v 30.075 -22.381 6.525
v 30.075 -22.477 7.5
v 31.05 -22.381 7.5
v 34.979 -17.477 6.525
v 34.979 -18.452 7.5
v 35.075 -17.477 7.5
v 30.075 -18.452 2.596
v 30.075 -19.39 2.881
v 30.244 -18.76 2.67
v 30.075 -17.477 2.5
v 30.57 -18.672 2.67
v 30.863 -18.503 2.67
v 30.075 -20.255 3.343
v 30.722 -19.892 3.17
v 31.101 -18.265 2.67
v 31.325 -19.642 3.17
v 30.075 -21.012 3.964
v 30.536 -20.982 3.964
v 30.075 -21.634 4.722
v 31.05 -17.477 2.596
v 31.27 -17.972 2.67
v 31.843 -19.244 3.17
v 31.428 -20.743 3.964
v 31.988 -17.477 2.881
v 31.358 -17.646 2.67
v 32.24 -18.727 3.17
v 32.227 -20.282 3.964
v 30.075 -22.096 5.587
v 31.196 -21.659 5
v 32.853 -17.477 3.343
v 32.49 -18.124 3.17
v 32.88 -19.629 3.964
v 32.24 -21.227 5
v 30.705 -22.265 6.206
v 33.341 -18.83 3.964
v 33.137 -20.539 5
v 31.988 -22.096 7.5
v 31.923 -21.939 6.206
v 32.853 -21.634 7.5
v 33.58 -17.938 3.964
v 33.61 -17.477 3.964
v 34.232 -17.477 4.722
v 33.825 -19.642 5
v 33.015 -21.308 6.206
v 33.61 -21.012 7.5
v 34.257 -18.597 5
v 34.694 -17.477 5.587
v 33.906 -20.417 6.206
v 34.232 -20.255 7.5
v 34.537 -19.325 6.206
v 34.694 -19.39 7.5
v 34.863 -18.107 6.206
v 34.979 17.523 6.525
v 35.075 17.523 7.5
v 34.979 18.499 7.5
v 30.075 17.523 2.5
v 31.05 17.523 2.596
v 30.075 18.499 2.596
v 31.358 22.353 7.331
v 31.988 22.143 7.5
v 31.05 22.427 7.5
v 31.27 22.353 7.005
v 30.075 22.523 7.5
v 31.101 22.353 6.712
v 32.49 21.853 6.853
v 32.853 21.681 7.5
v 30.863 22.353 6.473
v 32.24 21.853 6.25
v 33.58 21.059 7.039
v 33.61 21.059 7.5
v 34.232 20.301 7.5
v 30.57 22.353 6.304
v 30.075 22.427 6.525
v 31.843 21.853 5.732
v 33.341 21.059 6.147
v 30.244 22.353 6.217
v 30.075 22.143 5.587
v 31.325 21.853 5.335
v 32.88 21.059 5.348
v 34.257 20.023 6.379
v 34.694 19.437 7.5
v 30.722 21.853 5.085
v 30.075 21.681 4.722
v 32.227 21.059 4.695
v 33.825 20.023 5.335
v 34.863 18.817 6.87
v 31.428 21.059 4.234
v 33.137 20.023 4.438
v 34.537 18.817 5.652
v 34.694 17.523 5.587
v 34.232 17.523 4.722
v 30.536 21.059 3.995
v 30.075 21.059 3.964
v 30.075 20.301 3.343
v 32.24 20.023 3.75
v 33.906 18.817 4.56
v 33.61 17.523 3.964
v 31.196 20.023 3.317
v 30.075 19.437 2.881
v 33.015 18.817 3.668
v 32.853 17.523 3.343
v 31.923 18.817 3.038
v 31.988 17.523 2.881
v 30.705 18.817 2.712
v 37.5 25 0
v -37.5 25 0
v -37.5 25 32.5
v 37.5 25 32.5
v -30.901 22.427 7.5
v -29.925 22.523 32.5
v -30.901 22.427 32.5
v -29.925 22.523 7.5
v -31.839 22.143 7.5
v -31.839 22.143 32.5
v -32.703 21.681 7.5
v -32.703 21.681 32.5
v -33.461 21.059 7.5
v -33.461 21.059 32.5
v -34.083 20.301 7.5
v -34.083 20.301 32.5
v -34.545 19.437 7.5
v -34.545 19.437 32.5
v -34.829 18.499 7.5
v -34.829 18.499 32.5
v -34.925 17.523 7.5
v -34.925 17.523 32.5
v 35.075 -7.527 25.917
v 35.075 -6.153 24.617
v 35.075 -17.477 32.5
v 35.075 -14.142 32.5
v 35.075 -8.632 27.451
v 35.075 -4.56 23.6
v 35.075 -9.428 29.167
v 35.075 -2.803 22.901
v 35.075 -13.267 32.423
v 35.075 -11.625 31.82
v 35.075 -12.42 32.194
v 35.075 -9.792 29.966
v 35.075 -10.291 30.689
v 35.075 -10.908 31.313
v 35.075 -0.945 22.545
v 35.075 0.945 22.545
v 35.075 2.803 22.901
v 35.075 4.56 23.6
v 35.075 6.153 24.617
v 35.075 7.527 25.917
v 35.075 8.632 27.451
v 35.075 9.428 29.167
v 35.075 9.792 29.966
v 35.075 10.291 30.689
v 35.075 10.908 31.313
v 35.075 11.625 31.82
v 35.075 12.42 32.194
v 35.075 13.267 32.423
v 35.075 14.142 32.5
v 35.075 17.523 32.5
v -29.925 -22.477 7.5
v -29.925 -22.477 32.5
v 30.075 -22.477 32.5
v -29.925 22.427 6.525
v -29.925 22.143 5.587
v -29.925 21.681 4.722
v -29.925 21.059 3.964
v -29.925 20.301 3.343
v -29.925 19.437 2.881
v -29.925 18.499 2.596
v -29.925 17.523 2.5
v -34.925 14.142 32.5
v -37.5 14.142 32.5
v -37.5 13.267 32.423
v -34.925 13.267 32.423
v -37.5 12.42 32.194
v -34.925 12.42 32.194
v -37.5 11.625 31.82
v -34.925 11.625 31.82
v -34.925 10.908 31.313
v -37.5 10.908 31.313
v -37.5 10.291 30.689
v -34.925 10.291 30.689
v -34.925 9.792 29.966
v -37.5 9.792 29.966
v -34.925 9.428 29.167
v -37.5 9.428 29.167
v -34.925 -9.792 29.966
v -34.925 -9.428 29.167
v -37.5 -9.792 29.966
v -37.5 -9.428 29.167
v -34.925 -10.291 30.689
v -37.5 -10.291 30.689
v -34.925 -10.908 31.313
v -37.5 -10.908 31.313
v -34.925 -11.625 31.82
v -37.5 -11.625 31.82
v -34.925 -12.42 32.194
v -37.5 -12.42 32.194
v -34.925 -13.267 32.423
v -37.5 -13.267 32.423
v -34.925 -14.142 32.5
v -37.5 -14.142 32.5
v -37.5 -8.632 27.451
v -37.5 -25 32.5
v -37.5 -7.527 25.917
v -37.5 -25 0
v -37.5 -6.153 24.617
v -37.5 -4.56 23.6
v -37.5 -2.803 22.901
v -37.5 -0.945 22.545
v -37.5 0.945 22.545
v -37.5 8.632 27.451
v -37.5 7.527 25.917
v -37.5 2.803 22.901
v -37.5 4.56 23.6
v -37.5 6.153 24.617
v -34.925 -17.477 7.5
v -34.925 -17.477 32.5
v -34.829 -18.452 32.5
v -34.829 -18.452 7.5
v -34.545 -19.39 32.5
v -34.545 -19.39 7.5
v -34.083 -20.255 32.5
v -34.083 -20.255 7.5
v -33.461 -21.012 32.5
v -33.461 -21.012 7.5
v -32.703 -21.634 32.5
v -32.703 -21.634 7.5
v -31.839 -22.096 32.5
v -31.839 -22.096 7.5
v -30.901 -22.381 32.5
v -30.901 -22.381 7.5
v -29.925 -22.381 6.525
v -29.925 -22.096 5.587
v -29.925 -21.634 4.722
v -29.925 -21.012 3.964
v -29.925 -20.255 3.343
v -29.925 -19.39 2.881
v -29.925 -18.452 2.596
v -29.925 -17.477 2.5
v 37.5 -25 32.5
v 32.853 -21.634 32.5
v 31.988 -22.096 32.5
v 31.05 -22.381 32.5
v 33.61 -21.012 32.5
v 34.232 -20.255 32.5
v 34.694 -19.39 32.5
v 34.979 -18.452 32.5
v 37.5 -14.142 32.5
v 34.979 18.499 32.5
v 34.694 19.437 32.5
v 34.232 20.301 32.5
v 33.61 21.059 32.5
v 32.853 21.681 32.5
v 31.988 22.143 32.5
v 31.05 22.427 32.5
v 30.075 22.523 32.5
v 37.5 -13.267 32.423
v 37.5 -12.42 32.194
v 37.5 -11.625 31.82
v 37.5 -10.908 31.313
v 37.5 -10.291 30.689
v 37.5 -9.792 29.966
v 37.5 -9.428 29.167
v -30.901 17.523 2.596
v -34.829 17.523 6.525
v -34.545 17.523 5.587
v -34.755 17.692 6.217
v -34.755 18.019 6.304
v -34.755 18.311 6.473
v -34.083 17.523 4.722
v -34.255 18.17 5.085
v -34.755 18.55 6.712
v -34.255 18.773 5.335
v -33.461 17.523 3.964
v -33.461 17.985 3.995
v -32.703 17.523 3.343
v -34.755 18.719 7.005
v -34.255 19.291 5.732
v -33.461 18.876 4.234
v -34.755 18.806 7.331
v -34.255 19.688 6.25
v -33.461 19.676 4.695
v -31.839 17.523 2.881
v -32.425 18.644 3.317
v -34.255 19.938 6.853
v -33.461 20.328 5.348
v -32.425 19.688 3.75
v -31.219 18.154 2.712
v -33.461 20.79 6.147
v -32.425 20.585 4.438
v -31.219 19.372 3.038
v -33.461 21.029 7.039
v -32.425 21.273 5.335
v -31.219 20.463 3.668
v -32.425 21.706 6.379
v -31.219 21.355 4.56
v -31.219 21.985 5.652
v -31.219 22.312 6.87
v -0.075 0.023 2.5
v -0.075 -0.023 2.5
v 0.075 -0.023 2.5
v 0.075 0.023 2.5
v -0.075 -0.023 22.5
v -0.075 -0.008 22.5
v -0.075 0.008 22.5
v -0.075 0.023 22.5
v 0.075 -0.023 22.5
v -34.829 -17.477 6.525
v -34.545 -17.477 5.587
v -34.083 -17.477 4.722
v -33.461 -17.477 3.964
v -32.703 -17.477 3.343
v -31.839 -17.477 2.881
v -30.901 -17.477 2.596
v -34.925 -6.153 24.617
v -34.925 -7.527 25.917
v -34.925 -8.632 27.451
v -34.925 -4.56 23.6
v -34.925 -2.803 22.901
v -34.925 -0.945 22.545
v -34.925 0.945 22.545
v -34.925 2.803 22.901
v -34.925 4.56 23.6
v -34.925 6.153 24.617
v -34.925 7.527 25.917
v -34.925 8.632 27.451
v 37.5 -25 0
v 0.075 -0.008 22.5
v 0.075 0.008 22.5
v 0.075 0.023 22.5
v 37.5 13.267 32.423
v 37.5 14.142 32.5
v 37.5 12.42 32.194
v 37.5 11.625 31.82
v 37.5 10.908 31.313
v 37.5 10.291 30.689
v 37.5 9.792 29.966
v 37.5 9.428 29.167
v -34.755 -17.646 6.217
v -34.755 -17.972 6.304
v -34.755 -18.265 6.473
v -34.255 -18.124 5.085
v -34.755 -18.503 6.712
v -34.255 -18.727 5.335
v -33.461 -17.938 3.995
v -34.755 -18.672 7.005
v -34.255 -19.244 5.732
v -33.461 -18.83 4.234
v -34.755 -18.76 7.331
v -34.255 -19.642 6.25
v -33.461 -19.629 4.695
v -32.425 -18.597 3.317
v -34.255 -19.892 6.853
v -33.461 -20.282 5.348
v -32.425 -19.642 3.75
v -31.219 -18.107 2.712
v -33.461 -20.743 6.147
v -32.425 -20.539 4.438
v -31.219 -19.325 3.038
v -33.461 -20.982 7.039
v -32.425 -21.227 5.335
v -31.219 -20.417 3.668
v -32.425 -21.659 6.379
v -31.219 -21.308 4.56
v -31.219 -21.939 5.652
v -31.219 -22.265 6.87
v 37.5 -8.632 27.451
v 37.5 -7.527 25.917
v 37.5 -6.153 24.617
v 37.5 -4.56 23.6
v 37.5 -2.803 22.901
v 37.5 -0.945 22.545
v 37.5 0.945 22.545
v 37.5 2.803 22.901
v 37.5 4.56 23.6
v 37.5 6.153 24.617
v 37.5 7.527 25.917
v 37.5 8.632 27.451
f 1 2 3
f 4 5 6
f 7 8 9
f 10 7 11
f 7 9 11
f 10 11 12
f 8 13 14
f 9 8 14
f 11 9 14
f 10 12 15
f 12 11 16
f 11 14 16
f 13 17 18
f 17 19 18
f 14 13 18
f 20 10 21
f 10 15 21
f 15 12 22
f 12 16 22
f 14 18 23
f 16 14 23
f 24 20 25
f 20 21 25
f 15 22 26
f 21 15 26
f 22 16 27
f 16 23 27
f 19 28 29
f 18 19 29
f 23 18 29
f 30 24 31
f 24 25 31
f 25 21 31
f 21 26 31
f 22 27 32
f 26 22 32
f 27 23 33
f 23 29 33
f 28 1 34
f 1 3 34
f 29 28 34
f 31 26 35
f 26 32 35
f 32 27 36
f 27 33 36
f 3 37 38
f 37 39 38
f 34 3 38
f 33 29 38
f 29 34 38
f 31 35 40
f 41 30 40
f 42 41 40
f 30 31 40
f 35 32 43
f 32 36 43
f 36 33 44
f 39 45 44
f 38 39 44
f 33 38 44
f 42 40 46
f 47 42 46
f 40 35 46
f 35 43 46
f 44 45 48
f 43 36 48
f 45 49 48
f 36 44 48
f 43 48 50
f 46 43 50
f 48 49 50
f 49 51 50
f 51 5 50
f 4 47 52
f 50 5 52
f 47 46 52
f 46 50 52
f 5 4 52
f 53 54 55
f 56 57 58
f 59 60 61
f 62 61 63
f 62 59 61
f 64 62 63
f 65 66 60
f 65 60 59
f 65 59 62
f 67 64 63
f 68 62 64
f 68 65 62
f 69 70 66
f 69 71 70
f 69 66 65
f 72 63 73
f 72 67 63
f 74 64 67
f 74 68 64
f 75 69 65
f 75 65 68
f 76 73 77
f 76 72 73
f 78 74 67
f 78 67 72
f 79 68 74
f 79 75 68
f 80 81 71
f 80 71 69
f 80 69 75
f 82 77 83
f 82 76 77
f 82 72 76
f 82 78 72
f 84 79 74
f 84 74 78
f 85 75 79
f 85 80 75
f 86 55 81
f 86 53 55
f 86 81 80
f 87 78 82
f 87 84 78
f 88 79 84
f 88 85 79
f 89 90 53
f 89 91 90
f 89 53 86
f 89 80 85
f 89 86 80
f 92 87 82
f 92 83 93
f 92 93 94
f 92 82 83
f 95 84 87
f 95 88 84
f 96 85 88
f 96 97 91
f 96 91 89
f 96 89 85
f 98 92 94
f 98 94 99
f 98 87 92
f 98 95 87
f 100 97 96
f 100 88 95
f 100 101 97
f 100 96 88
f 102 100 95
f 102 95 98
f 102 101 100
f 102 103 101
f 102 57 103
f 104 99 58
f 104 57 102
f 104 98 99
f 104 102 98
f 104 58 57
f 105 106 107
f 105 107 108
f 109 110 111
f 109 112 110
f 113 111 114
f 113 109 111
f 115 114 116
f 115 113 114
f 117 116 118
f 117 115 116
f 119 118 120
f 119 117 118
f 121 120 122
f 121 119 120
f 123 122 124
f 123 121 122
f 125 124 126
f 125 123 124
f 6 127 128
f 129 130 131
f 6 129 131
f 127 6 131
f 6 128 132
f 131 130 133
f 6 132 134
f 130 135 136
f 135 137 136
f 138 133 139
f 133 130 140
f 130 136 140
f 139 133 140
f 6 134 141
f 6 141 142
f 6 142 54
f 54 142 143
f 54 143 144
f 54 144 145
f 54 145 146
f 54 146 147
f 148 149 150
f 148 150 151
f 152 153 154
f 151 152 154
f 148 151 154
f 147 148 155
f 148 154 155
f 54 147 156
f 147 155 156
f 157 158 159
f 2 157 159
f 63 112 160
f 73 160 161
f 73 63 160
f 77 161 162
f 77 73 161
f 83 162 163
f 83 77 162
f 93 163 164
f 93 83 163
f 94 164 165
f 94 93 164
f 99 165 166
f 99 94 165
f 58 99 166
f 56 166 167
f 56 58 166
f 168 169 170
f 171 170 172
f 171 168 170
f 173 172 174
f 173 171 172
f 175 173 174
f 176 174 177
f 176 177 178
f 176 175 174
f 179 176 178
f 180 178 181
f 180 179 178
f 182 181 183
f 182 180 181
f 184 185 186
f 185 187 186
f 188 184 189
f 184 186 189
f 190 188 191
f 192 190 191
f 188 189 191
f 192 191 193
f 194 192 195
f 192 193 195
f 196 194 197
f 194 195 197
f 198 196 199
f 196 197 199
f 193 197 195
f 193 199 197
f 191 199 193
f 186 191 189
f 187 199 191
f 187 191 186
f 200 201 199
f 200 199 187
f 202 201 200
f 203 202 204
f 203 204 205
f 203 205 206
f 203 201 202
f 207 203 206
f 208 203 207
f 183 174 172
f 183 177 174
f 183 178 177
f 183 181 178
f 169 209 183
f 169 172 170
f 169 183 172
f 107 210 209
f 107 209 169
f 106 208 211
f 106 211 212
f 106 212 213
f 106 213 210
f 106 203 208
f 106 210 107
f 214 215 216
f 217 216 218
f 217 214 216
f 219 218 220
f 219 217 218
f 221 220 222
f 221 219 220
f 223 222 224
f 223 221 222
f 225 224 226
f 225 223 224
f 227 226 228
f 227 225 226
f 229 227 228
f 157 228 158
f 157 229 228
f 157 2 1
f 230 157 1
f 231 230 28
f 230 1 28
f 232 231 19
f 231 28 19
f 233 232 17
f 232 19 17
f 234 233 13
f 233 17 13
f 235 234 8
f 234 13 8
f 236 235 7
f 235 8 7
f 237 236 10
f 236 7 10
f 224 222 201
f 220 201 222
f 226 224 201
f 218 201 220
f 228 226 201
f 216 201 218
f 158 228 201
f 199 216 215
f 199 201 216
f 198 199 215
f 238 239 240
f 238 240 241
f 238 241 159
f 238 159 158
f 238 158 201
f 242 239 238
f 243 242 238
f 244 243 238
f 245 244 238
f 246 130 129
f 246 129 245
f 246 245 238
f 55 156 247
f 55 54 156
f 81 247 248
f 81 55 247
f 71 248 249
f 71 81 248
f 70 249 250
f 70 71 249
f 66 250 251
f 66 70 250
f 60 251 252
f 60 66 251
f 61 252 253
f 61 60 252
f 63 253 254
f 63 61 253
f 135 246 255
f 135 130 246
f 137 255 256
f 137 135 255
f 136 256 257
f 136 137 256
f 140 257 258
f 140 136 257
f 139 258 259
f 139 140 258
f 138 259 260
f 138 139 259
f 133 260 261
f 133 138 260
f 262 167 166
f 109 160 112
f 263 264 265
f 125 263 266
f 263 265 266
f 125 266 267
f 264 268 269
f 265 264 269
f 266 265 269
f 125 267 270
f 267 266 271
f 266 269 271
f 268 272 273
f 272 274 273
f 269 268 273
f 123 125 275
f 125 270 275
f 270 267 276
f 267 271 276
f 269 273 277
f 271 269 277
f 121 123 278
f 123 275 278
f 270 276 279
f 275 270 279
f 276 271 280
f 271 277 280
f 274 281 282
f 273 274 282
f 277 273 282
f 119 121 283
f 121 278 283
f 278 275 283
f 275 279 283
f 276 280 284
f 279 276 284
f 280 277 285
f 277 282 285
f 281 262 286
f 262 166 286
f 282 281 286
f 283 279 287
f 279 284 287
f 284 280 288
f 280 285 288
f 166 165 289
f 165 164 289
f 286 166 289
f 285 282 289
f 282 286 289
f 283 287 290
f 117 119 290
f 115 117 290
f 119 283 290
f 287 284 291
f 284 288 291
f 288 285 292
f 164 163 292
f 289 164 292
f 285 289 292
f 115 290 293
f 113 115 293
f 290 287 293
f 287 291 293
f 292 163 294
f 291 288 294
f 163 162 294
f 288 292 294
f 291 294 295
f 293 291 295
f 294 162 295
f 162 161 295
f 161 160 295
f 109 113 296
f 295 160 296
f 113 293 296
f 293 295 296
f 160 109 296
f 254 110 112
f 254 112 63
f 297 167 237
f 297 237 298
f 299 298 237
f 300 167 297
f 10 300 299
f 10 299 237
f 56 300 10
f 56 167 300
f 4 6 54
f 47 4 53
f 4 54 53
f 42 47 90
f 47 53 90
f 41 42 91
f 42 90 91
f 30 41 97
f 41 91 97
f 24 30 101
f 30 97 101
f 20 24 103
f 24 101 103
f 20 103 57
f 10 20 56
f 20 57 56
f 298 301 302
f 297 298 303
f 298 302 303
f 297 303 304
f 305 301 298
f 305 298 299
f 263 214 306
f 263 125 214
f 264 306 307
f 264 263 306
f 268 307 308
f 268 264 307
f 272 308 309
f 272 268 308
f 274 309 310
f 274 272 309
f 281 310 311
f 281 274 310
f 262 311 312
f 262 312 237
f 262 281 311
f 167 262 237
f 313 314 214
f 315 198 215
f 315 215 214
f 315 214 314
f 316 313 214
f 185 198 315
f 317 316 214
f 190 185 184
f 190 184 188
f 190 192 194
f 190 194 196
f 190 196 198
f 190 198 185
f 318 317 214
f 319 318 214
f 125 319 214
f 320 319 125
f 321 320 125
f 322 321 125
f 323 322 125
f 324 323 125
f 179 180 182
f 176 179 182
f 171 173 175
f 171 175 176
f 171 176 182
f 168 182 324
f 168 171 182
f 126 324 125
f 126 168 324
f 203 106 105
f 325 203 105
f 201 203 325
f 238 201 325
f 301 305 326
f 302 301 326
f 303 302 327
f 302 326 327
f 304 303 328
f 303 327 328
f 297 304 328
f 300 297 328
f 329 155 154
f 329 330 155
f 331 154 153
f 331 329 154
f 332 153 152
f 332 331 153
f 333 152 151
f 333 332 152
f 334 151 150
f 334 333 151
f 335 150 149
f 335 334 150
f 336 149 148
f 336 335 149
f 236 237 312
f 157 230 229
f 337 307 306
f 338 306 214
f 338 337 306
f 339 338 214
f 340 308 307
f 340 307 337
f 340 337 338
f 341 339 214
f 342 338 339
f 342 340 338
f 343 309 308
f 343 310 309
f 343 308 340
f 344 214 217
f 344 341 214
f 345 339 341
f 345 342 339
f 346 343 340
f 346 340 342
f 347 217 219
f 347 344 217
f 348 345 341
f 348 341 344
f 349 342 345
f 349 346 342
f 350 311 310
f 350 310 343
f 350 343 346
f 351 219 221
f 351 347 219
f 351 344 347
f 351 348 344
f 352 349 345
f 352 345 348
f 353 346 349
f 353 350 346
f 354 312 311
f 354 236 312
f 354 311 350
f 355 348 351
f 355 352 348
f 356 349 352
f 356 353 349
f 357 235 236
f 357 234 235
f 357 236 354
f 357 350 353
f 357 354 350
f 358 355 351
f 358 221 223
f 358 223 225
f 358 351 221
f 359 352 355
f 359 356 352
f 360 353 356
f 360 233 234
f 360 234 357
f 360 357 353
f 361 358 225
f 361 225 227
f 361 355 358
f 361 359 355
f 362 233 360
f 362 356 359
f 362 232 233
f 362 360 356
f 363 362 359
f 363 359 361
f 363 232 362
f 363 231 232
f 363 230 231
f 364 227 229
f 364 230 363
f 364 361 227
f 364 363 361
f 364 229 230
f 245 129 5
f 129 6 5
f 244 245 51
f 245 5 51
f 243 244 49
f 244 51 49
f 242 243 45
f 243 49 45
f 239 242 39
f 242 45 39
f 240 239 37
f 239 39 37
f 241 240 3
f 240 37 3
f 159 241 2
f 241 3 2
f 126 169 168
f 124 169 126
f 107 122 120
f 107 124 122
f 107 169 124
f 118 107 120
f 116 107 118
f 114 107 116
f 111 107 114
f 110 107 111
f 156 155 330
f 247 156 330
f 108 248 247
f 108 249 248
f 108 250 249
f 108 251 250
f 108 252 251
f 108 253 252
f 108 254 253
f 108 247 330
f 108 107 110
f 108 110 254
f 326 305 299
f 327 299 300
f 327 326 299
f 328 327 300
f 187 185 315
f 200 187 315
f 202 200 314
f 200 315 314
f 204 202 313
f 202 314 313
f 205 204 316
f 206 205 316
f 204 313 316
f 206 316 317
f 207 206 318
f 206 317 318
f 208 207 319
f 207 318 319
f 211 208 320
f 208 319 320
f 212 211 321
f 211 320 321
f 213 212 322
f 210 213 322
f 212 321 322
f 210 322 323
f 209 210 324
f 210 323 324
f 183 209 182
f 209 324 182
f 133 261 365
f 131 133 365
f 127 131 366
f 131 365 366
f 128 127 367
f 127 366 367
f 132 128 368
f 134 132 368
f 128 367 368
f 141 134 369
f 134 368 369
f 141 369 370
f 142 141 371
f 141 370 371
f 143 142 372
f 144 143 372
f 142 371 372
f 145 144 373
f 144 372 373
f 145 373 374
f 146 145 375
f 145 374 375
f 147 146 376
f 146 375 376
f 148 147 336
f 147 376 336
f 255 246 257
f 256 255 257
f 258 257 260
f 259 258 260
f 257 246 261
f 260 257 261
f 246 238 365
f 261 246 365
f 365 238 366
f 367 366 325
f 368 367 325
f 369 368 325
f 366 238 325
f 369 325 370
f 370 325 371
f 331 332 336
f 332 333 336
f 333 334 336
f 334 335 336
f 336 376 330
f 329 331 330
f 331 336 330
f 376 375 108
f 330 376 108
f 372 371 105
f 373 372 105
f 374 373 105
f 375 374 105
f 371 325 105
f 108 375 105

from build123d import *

# Parameters (mm, degrees)
F1_W     = 75
F1_H     = 50
F2_DEPTH = 32.5
F3_W     = 70
F3_H     = 45
F3_W_2   = 0.1495928758
F3_H_2   = 0.0465683566
F4_DEPTH = 30
F5_R     = 10
F6_DEPTH = 76
F7_R     = 5


with BuildPart() as f2:
    # F1 (on Top) → F2 (new body)
    with BuildSketch(Plane.XY):
        Rectangle(F1_W, F1_H)
    extrude(amount=F2_DEPTH)

    # F3 (on face) → F4 (cut)
    with BuildSketch(Plane.XY.offset(32.5)):
        with Locations((0.0747964379, 0.0232841783)):
            Rectangle(F3_W, F3_H)
        Rectangle(F3_W_2, F3_H_2, mode=Mode.SUBTRACT)
    extrude(amount=-F4_DEPTH, mode=Mode.SUBTRACT)

    # F5 (on face) → F6 (cut)
    with BuildSketch(Plane.YZ.offset(37.5)):
        with Locations((0, 32.5)):
            Circle(F5_R)
        with BuildLine():
            ThreePointArc((-10, 32.5), (0, 22.5), (10, 32.5))
            Line((10, 32.5), (-10, 32.5))
        make_face()
    extrude(amount=-F6_DEPTH, mode=Mode.SUBTRACT)

    # F7
    f7_edges = [f2.edges().sort_by_distance(p)[0] for p in [
        (35.074796, -22.476716, 17.5),
        (0.074796, -22.476716, 2.5),
        (35.074796, 0.023284, 2.5),
        (-36.212602, -10, 32.5),
        (36.287398, -10, 32.5),
        (36.287398, 10, 32.5),
        (-36.212602, 10, 32.5),
        (35.074796, 22.523284, 17.5),
        (0.074796, 22.523284, 2.5),
        (-34.925204, 0.023284, 2.5),
        (-34.925204, -22.476716, 17.5),
        (-34.925204, 22.523284, 17.5),
    ]]
    fillet(f7_edges, radius=F7_R)


solid = f2.part
